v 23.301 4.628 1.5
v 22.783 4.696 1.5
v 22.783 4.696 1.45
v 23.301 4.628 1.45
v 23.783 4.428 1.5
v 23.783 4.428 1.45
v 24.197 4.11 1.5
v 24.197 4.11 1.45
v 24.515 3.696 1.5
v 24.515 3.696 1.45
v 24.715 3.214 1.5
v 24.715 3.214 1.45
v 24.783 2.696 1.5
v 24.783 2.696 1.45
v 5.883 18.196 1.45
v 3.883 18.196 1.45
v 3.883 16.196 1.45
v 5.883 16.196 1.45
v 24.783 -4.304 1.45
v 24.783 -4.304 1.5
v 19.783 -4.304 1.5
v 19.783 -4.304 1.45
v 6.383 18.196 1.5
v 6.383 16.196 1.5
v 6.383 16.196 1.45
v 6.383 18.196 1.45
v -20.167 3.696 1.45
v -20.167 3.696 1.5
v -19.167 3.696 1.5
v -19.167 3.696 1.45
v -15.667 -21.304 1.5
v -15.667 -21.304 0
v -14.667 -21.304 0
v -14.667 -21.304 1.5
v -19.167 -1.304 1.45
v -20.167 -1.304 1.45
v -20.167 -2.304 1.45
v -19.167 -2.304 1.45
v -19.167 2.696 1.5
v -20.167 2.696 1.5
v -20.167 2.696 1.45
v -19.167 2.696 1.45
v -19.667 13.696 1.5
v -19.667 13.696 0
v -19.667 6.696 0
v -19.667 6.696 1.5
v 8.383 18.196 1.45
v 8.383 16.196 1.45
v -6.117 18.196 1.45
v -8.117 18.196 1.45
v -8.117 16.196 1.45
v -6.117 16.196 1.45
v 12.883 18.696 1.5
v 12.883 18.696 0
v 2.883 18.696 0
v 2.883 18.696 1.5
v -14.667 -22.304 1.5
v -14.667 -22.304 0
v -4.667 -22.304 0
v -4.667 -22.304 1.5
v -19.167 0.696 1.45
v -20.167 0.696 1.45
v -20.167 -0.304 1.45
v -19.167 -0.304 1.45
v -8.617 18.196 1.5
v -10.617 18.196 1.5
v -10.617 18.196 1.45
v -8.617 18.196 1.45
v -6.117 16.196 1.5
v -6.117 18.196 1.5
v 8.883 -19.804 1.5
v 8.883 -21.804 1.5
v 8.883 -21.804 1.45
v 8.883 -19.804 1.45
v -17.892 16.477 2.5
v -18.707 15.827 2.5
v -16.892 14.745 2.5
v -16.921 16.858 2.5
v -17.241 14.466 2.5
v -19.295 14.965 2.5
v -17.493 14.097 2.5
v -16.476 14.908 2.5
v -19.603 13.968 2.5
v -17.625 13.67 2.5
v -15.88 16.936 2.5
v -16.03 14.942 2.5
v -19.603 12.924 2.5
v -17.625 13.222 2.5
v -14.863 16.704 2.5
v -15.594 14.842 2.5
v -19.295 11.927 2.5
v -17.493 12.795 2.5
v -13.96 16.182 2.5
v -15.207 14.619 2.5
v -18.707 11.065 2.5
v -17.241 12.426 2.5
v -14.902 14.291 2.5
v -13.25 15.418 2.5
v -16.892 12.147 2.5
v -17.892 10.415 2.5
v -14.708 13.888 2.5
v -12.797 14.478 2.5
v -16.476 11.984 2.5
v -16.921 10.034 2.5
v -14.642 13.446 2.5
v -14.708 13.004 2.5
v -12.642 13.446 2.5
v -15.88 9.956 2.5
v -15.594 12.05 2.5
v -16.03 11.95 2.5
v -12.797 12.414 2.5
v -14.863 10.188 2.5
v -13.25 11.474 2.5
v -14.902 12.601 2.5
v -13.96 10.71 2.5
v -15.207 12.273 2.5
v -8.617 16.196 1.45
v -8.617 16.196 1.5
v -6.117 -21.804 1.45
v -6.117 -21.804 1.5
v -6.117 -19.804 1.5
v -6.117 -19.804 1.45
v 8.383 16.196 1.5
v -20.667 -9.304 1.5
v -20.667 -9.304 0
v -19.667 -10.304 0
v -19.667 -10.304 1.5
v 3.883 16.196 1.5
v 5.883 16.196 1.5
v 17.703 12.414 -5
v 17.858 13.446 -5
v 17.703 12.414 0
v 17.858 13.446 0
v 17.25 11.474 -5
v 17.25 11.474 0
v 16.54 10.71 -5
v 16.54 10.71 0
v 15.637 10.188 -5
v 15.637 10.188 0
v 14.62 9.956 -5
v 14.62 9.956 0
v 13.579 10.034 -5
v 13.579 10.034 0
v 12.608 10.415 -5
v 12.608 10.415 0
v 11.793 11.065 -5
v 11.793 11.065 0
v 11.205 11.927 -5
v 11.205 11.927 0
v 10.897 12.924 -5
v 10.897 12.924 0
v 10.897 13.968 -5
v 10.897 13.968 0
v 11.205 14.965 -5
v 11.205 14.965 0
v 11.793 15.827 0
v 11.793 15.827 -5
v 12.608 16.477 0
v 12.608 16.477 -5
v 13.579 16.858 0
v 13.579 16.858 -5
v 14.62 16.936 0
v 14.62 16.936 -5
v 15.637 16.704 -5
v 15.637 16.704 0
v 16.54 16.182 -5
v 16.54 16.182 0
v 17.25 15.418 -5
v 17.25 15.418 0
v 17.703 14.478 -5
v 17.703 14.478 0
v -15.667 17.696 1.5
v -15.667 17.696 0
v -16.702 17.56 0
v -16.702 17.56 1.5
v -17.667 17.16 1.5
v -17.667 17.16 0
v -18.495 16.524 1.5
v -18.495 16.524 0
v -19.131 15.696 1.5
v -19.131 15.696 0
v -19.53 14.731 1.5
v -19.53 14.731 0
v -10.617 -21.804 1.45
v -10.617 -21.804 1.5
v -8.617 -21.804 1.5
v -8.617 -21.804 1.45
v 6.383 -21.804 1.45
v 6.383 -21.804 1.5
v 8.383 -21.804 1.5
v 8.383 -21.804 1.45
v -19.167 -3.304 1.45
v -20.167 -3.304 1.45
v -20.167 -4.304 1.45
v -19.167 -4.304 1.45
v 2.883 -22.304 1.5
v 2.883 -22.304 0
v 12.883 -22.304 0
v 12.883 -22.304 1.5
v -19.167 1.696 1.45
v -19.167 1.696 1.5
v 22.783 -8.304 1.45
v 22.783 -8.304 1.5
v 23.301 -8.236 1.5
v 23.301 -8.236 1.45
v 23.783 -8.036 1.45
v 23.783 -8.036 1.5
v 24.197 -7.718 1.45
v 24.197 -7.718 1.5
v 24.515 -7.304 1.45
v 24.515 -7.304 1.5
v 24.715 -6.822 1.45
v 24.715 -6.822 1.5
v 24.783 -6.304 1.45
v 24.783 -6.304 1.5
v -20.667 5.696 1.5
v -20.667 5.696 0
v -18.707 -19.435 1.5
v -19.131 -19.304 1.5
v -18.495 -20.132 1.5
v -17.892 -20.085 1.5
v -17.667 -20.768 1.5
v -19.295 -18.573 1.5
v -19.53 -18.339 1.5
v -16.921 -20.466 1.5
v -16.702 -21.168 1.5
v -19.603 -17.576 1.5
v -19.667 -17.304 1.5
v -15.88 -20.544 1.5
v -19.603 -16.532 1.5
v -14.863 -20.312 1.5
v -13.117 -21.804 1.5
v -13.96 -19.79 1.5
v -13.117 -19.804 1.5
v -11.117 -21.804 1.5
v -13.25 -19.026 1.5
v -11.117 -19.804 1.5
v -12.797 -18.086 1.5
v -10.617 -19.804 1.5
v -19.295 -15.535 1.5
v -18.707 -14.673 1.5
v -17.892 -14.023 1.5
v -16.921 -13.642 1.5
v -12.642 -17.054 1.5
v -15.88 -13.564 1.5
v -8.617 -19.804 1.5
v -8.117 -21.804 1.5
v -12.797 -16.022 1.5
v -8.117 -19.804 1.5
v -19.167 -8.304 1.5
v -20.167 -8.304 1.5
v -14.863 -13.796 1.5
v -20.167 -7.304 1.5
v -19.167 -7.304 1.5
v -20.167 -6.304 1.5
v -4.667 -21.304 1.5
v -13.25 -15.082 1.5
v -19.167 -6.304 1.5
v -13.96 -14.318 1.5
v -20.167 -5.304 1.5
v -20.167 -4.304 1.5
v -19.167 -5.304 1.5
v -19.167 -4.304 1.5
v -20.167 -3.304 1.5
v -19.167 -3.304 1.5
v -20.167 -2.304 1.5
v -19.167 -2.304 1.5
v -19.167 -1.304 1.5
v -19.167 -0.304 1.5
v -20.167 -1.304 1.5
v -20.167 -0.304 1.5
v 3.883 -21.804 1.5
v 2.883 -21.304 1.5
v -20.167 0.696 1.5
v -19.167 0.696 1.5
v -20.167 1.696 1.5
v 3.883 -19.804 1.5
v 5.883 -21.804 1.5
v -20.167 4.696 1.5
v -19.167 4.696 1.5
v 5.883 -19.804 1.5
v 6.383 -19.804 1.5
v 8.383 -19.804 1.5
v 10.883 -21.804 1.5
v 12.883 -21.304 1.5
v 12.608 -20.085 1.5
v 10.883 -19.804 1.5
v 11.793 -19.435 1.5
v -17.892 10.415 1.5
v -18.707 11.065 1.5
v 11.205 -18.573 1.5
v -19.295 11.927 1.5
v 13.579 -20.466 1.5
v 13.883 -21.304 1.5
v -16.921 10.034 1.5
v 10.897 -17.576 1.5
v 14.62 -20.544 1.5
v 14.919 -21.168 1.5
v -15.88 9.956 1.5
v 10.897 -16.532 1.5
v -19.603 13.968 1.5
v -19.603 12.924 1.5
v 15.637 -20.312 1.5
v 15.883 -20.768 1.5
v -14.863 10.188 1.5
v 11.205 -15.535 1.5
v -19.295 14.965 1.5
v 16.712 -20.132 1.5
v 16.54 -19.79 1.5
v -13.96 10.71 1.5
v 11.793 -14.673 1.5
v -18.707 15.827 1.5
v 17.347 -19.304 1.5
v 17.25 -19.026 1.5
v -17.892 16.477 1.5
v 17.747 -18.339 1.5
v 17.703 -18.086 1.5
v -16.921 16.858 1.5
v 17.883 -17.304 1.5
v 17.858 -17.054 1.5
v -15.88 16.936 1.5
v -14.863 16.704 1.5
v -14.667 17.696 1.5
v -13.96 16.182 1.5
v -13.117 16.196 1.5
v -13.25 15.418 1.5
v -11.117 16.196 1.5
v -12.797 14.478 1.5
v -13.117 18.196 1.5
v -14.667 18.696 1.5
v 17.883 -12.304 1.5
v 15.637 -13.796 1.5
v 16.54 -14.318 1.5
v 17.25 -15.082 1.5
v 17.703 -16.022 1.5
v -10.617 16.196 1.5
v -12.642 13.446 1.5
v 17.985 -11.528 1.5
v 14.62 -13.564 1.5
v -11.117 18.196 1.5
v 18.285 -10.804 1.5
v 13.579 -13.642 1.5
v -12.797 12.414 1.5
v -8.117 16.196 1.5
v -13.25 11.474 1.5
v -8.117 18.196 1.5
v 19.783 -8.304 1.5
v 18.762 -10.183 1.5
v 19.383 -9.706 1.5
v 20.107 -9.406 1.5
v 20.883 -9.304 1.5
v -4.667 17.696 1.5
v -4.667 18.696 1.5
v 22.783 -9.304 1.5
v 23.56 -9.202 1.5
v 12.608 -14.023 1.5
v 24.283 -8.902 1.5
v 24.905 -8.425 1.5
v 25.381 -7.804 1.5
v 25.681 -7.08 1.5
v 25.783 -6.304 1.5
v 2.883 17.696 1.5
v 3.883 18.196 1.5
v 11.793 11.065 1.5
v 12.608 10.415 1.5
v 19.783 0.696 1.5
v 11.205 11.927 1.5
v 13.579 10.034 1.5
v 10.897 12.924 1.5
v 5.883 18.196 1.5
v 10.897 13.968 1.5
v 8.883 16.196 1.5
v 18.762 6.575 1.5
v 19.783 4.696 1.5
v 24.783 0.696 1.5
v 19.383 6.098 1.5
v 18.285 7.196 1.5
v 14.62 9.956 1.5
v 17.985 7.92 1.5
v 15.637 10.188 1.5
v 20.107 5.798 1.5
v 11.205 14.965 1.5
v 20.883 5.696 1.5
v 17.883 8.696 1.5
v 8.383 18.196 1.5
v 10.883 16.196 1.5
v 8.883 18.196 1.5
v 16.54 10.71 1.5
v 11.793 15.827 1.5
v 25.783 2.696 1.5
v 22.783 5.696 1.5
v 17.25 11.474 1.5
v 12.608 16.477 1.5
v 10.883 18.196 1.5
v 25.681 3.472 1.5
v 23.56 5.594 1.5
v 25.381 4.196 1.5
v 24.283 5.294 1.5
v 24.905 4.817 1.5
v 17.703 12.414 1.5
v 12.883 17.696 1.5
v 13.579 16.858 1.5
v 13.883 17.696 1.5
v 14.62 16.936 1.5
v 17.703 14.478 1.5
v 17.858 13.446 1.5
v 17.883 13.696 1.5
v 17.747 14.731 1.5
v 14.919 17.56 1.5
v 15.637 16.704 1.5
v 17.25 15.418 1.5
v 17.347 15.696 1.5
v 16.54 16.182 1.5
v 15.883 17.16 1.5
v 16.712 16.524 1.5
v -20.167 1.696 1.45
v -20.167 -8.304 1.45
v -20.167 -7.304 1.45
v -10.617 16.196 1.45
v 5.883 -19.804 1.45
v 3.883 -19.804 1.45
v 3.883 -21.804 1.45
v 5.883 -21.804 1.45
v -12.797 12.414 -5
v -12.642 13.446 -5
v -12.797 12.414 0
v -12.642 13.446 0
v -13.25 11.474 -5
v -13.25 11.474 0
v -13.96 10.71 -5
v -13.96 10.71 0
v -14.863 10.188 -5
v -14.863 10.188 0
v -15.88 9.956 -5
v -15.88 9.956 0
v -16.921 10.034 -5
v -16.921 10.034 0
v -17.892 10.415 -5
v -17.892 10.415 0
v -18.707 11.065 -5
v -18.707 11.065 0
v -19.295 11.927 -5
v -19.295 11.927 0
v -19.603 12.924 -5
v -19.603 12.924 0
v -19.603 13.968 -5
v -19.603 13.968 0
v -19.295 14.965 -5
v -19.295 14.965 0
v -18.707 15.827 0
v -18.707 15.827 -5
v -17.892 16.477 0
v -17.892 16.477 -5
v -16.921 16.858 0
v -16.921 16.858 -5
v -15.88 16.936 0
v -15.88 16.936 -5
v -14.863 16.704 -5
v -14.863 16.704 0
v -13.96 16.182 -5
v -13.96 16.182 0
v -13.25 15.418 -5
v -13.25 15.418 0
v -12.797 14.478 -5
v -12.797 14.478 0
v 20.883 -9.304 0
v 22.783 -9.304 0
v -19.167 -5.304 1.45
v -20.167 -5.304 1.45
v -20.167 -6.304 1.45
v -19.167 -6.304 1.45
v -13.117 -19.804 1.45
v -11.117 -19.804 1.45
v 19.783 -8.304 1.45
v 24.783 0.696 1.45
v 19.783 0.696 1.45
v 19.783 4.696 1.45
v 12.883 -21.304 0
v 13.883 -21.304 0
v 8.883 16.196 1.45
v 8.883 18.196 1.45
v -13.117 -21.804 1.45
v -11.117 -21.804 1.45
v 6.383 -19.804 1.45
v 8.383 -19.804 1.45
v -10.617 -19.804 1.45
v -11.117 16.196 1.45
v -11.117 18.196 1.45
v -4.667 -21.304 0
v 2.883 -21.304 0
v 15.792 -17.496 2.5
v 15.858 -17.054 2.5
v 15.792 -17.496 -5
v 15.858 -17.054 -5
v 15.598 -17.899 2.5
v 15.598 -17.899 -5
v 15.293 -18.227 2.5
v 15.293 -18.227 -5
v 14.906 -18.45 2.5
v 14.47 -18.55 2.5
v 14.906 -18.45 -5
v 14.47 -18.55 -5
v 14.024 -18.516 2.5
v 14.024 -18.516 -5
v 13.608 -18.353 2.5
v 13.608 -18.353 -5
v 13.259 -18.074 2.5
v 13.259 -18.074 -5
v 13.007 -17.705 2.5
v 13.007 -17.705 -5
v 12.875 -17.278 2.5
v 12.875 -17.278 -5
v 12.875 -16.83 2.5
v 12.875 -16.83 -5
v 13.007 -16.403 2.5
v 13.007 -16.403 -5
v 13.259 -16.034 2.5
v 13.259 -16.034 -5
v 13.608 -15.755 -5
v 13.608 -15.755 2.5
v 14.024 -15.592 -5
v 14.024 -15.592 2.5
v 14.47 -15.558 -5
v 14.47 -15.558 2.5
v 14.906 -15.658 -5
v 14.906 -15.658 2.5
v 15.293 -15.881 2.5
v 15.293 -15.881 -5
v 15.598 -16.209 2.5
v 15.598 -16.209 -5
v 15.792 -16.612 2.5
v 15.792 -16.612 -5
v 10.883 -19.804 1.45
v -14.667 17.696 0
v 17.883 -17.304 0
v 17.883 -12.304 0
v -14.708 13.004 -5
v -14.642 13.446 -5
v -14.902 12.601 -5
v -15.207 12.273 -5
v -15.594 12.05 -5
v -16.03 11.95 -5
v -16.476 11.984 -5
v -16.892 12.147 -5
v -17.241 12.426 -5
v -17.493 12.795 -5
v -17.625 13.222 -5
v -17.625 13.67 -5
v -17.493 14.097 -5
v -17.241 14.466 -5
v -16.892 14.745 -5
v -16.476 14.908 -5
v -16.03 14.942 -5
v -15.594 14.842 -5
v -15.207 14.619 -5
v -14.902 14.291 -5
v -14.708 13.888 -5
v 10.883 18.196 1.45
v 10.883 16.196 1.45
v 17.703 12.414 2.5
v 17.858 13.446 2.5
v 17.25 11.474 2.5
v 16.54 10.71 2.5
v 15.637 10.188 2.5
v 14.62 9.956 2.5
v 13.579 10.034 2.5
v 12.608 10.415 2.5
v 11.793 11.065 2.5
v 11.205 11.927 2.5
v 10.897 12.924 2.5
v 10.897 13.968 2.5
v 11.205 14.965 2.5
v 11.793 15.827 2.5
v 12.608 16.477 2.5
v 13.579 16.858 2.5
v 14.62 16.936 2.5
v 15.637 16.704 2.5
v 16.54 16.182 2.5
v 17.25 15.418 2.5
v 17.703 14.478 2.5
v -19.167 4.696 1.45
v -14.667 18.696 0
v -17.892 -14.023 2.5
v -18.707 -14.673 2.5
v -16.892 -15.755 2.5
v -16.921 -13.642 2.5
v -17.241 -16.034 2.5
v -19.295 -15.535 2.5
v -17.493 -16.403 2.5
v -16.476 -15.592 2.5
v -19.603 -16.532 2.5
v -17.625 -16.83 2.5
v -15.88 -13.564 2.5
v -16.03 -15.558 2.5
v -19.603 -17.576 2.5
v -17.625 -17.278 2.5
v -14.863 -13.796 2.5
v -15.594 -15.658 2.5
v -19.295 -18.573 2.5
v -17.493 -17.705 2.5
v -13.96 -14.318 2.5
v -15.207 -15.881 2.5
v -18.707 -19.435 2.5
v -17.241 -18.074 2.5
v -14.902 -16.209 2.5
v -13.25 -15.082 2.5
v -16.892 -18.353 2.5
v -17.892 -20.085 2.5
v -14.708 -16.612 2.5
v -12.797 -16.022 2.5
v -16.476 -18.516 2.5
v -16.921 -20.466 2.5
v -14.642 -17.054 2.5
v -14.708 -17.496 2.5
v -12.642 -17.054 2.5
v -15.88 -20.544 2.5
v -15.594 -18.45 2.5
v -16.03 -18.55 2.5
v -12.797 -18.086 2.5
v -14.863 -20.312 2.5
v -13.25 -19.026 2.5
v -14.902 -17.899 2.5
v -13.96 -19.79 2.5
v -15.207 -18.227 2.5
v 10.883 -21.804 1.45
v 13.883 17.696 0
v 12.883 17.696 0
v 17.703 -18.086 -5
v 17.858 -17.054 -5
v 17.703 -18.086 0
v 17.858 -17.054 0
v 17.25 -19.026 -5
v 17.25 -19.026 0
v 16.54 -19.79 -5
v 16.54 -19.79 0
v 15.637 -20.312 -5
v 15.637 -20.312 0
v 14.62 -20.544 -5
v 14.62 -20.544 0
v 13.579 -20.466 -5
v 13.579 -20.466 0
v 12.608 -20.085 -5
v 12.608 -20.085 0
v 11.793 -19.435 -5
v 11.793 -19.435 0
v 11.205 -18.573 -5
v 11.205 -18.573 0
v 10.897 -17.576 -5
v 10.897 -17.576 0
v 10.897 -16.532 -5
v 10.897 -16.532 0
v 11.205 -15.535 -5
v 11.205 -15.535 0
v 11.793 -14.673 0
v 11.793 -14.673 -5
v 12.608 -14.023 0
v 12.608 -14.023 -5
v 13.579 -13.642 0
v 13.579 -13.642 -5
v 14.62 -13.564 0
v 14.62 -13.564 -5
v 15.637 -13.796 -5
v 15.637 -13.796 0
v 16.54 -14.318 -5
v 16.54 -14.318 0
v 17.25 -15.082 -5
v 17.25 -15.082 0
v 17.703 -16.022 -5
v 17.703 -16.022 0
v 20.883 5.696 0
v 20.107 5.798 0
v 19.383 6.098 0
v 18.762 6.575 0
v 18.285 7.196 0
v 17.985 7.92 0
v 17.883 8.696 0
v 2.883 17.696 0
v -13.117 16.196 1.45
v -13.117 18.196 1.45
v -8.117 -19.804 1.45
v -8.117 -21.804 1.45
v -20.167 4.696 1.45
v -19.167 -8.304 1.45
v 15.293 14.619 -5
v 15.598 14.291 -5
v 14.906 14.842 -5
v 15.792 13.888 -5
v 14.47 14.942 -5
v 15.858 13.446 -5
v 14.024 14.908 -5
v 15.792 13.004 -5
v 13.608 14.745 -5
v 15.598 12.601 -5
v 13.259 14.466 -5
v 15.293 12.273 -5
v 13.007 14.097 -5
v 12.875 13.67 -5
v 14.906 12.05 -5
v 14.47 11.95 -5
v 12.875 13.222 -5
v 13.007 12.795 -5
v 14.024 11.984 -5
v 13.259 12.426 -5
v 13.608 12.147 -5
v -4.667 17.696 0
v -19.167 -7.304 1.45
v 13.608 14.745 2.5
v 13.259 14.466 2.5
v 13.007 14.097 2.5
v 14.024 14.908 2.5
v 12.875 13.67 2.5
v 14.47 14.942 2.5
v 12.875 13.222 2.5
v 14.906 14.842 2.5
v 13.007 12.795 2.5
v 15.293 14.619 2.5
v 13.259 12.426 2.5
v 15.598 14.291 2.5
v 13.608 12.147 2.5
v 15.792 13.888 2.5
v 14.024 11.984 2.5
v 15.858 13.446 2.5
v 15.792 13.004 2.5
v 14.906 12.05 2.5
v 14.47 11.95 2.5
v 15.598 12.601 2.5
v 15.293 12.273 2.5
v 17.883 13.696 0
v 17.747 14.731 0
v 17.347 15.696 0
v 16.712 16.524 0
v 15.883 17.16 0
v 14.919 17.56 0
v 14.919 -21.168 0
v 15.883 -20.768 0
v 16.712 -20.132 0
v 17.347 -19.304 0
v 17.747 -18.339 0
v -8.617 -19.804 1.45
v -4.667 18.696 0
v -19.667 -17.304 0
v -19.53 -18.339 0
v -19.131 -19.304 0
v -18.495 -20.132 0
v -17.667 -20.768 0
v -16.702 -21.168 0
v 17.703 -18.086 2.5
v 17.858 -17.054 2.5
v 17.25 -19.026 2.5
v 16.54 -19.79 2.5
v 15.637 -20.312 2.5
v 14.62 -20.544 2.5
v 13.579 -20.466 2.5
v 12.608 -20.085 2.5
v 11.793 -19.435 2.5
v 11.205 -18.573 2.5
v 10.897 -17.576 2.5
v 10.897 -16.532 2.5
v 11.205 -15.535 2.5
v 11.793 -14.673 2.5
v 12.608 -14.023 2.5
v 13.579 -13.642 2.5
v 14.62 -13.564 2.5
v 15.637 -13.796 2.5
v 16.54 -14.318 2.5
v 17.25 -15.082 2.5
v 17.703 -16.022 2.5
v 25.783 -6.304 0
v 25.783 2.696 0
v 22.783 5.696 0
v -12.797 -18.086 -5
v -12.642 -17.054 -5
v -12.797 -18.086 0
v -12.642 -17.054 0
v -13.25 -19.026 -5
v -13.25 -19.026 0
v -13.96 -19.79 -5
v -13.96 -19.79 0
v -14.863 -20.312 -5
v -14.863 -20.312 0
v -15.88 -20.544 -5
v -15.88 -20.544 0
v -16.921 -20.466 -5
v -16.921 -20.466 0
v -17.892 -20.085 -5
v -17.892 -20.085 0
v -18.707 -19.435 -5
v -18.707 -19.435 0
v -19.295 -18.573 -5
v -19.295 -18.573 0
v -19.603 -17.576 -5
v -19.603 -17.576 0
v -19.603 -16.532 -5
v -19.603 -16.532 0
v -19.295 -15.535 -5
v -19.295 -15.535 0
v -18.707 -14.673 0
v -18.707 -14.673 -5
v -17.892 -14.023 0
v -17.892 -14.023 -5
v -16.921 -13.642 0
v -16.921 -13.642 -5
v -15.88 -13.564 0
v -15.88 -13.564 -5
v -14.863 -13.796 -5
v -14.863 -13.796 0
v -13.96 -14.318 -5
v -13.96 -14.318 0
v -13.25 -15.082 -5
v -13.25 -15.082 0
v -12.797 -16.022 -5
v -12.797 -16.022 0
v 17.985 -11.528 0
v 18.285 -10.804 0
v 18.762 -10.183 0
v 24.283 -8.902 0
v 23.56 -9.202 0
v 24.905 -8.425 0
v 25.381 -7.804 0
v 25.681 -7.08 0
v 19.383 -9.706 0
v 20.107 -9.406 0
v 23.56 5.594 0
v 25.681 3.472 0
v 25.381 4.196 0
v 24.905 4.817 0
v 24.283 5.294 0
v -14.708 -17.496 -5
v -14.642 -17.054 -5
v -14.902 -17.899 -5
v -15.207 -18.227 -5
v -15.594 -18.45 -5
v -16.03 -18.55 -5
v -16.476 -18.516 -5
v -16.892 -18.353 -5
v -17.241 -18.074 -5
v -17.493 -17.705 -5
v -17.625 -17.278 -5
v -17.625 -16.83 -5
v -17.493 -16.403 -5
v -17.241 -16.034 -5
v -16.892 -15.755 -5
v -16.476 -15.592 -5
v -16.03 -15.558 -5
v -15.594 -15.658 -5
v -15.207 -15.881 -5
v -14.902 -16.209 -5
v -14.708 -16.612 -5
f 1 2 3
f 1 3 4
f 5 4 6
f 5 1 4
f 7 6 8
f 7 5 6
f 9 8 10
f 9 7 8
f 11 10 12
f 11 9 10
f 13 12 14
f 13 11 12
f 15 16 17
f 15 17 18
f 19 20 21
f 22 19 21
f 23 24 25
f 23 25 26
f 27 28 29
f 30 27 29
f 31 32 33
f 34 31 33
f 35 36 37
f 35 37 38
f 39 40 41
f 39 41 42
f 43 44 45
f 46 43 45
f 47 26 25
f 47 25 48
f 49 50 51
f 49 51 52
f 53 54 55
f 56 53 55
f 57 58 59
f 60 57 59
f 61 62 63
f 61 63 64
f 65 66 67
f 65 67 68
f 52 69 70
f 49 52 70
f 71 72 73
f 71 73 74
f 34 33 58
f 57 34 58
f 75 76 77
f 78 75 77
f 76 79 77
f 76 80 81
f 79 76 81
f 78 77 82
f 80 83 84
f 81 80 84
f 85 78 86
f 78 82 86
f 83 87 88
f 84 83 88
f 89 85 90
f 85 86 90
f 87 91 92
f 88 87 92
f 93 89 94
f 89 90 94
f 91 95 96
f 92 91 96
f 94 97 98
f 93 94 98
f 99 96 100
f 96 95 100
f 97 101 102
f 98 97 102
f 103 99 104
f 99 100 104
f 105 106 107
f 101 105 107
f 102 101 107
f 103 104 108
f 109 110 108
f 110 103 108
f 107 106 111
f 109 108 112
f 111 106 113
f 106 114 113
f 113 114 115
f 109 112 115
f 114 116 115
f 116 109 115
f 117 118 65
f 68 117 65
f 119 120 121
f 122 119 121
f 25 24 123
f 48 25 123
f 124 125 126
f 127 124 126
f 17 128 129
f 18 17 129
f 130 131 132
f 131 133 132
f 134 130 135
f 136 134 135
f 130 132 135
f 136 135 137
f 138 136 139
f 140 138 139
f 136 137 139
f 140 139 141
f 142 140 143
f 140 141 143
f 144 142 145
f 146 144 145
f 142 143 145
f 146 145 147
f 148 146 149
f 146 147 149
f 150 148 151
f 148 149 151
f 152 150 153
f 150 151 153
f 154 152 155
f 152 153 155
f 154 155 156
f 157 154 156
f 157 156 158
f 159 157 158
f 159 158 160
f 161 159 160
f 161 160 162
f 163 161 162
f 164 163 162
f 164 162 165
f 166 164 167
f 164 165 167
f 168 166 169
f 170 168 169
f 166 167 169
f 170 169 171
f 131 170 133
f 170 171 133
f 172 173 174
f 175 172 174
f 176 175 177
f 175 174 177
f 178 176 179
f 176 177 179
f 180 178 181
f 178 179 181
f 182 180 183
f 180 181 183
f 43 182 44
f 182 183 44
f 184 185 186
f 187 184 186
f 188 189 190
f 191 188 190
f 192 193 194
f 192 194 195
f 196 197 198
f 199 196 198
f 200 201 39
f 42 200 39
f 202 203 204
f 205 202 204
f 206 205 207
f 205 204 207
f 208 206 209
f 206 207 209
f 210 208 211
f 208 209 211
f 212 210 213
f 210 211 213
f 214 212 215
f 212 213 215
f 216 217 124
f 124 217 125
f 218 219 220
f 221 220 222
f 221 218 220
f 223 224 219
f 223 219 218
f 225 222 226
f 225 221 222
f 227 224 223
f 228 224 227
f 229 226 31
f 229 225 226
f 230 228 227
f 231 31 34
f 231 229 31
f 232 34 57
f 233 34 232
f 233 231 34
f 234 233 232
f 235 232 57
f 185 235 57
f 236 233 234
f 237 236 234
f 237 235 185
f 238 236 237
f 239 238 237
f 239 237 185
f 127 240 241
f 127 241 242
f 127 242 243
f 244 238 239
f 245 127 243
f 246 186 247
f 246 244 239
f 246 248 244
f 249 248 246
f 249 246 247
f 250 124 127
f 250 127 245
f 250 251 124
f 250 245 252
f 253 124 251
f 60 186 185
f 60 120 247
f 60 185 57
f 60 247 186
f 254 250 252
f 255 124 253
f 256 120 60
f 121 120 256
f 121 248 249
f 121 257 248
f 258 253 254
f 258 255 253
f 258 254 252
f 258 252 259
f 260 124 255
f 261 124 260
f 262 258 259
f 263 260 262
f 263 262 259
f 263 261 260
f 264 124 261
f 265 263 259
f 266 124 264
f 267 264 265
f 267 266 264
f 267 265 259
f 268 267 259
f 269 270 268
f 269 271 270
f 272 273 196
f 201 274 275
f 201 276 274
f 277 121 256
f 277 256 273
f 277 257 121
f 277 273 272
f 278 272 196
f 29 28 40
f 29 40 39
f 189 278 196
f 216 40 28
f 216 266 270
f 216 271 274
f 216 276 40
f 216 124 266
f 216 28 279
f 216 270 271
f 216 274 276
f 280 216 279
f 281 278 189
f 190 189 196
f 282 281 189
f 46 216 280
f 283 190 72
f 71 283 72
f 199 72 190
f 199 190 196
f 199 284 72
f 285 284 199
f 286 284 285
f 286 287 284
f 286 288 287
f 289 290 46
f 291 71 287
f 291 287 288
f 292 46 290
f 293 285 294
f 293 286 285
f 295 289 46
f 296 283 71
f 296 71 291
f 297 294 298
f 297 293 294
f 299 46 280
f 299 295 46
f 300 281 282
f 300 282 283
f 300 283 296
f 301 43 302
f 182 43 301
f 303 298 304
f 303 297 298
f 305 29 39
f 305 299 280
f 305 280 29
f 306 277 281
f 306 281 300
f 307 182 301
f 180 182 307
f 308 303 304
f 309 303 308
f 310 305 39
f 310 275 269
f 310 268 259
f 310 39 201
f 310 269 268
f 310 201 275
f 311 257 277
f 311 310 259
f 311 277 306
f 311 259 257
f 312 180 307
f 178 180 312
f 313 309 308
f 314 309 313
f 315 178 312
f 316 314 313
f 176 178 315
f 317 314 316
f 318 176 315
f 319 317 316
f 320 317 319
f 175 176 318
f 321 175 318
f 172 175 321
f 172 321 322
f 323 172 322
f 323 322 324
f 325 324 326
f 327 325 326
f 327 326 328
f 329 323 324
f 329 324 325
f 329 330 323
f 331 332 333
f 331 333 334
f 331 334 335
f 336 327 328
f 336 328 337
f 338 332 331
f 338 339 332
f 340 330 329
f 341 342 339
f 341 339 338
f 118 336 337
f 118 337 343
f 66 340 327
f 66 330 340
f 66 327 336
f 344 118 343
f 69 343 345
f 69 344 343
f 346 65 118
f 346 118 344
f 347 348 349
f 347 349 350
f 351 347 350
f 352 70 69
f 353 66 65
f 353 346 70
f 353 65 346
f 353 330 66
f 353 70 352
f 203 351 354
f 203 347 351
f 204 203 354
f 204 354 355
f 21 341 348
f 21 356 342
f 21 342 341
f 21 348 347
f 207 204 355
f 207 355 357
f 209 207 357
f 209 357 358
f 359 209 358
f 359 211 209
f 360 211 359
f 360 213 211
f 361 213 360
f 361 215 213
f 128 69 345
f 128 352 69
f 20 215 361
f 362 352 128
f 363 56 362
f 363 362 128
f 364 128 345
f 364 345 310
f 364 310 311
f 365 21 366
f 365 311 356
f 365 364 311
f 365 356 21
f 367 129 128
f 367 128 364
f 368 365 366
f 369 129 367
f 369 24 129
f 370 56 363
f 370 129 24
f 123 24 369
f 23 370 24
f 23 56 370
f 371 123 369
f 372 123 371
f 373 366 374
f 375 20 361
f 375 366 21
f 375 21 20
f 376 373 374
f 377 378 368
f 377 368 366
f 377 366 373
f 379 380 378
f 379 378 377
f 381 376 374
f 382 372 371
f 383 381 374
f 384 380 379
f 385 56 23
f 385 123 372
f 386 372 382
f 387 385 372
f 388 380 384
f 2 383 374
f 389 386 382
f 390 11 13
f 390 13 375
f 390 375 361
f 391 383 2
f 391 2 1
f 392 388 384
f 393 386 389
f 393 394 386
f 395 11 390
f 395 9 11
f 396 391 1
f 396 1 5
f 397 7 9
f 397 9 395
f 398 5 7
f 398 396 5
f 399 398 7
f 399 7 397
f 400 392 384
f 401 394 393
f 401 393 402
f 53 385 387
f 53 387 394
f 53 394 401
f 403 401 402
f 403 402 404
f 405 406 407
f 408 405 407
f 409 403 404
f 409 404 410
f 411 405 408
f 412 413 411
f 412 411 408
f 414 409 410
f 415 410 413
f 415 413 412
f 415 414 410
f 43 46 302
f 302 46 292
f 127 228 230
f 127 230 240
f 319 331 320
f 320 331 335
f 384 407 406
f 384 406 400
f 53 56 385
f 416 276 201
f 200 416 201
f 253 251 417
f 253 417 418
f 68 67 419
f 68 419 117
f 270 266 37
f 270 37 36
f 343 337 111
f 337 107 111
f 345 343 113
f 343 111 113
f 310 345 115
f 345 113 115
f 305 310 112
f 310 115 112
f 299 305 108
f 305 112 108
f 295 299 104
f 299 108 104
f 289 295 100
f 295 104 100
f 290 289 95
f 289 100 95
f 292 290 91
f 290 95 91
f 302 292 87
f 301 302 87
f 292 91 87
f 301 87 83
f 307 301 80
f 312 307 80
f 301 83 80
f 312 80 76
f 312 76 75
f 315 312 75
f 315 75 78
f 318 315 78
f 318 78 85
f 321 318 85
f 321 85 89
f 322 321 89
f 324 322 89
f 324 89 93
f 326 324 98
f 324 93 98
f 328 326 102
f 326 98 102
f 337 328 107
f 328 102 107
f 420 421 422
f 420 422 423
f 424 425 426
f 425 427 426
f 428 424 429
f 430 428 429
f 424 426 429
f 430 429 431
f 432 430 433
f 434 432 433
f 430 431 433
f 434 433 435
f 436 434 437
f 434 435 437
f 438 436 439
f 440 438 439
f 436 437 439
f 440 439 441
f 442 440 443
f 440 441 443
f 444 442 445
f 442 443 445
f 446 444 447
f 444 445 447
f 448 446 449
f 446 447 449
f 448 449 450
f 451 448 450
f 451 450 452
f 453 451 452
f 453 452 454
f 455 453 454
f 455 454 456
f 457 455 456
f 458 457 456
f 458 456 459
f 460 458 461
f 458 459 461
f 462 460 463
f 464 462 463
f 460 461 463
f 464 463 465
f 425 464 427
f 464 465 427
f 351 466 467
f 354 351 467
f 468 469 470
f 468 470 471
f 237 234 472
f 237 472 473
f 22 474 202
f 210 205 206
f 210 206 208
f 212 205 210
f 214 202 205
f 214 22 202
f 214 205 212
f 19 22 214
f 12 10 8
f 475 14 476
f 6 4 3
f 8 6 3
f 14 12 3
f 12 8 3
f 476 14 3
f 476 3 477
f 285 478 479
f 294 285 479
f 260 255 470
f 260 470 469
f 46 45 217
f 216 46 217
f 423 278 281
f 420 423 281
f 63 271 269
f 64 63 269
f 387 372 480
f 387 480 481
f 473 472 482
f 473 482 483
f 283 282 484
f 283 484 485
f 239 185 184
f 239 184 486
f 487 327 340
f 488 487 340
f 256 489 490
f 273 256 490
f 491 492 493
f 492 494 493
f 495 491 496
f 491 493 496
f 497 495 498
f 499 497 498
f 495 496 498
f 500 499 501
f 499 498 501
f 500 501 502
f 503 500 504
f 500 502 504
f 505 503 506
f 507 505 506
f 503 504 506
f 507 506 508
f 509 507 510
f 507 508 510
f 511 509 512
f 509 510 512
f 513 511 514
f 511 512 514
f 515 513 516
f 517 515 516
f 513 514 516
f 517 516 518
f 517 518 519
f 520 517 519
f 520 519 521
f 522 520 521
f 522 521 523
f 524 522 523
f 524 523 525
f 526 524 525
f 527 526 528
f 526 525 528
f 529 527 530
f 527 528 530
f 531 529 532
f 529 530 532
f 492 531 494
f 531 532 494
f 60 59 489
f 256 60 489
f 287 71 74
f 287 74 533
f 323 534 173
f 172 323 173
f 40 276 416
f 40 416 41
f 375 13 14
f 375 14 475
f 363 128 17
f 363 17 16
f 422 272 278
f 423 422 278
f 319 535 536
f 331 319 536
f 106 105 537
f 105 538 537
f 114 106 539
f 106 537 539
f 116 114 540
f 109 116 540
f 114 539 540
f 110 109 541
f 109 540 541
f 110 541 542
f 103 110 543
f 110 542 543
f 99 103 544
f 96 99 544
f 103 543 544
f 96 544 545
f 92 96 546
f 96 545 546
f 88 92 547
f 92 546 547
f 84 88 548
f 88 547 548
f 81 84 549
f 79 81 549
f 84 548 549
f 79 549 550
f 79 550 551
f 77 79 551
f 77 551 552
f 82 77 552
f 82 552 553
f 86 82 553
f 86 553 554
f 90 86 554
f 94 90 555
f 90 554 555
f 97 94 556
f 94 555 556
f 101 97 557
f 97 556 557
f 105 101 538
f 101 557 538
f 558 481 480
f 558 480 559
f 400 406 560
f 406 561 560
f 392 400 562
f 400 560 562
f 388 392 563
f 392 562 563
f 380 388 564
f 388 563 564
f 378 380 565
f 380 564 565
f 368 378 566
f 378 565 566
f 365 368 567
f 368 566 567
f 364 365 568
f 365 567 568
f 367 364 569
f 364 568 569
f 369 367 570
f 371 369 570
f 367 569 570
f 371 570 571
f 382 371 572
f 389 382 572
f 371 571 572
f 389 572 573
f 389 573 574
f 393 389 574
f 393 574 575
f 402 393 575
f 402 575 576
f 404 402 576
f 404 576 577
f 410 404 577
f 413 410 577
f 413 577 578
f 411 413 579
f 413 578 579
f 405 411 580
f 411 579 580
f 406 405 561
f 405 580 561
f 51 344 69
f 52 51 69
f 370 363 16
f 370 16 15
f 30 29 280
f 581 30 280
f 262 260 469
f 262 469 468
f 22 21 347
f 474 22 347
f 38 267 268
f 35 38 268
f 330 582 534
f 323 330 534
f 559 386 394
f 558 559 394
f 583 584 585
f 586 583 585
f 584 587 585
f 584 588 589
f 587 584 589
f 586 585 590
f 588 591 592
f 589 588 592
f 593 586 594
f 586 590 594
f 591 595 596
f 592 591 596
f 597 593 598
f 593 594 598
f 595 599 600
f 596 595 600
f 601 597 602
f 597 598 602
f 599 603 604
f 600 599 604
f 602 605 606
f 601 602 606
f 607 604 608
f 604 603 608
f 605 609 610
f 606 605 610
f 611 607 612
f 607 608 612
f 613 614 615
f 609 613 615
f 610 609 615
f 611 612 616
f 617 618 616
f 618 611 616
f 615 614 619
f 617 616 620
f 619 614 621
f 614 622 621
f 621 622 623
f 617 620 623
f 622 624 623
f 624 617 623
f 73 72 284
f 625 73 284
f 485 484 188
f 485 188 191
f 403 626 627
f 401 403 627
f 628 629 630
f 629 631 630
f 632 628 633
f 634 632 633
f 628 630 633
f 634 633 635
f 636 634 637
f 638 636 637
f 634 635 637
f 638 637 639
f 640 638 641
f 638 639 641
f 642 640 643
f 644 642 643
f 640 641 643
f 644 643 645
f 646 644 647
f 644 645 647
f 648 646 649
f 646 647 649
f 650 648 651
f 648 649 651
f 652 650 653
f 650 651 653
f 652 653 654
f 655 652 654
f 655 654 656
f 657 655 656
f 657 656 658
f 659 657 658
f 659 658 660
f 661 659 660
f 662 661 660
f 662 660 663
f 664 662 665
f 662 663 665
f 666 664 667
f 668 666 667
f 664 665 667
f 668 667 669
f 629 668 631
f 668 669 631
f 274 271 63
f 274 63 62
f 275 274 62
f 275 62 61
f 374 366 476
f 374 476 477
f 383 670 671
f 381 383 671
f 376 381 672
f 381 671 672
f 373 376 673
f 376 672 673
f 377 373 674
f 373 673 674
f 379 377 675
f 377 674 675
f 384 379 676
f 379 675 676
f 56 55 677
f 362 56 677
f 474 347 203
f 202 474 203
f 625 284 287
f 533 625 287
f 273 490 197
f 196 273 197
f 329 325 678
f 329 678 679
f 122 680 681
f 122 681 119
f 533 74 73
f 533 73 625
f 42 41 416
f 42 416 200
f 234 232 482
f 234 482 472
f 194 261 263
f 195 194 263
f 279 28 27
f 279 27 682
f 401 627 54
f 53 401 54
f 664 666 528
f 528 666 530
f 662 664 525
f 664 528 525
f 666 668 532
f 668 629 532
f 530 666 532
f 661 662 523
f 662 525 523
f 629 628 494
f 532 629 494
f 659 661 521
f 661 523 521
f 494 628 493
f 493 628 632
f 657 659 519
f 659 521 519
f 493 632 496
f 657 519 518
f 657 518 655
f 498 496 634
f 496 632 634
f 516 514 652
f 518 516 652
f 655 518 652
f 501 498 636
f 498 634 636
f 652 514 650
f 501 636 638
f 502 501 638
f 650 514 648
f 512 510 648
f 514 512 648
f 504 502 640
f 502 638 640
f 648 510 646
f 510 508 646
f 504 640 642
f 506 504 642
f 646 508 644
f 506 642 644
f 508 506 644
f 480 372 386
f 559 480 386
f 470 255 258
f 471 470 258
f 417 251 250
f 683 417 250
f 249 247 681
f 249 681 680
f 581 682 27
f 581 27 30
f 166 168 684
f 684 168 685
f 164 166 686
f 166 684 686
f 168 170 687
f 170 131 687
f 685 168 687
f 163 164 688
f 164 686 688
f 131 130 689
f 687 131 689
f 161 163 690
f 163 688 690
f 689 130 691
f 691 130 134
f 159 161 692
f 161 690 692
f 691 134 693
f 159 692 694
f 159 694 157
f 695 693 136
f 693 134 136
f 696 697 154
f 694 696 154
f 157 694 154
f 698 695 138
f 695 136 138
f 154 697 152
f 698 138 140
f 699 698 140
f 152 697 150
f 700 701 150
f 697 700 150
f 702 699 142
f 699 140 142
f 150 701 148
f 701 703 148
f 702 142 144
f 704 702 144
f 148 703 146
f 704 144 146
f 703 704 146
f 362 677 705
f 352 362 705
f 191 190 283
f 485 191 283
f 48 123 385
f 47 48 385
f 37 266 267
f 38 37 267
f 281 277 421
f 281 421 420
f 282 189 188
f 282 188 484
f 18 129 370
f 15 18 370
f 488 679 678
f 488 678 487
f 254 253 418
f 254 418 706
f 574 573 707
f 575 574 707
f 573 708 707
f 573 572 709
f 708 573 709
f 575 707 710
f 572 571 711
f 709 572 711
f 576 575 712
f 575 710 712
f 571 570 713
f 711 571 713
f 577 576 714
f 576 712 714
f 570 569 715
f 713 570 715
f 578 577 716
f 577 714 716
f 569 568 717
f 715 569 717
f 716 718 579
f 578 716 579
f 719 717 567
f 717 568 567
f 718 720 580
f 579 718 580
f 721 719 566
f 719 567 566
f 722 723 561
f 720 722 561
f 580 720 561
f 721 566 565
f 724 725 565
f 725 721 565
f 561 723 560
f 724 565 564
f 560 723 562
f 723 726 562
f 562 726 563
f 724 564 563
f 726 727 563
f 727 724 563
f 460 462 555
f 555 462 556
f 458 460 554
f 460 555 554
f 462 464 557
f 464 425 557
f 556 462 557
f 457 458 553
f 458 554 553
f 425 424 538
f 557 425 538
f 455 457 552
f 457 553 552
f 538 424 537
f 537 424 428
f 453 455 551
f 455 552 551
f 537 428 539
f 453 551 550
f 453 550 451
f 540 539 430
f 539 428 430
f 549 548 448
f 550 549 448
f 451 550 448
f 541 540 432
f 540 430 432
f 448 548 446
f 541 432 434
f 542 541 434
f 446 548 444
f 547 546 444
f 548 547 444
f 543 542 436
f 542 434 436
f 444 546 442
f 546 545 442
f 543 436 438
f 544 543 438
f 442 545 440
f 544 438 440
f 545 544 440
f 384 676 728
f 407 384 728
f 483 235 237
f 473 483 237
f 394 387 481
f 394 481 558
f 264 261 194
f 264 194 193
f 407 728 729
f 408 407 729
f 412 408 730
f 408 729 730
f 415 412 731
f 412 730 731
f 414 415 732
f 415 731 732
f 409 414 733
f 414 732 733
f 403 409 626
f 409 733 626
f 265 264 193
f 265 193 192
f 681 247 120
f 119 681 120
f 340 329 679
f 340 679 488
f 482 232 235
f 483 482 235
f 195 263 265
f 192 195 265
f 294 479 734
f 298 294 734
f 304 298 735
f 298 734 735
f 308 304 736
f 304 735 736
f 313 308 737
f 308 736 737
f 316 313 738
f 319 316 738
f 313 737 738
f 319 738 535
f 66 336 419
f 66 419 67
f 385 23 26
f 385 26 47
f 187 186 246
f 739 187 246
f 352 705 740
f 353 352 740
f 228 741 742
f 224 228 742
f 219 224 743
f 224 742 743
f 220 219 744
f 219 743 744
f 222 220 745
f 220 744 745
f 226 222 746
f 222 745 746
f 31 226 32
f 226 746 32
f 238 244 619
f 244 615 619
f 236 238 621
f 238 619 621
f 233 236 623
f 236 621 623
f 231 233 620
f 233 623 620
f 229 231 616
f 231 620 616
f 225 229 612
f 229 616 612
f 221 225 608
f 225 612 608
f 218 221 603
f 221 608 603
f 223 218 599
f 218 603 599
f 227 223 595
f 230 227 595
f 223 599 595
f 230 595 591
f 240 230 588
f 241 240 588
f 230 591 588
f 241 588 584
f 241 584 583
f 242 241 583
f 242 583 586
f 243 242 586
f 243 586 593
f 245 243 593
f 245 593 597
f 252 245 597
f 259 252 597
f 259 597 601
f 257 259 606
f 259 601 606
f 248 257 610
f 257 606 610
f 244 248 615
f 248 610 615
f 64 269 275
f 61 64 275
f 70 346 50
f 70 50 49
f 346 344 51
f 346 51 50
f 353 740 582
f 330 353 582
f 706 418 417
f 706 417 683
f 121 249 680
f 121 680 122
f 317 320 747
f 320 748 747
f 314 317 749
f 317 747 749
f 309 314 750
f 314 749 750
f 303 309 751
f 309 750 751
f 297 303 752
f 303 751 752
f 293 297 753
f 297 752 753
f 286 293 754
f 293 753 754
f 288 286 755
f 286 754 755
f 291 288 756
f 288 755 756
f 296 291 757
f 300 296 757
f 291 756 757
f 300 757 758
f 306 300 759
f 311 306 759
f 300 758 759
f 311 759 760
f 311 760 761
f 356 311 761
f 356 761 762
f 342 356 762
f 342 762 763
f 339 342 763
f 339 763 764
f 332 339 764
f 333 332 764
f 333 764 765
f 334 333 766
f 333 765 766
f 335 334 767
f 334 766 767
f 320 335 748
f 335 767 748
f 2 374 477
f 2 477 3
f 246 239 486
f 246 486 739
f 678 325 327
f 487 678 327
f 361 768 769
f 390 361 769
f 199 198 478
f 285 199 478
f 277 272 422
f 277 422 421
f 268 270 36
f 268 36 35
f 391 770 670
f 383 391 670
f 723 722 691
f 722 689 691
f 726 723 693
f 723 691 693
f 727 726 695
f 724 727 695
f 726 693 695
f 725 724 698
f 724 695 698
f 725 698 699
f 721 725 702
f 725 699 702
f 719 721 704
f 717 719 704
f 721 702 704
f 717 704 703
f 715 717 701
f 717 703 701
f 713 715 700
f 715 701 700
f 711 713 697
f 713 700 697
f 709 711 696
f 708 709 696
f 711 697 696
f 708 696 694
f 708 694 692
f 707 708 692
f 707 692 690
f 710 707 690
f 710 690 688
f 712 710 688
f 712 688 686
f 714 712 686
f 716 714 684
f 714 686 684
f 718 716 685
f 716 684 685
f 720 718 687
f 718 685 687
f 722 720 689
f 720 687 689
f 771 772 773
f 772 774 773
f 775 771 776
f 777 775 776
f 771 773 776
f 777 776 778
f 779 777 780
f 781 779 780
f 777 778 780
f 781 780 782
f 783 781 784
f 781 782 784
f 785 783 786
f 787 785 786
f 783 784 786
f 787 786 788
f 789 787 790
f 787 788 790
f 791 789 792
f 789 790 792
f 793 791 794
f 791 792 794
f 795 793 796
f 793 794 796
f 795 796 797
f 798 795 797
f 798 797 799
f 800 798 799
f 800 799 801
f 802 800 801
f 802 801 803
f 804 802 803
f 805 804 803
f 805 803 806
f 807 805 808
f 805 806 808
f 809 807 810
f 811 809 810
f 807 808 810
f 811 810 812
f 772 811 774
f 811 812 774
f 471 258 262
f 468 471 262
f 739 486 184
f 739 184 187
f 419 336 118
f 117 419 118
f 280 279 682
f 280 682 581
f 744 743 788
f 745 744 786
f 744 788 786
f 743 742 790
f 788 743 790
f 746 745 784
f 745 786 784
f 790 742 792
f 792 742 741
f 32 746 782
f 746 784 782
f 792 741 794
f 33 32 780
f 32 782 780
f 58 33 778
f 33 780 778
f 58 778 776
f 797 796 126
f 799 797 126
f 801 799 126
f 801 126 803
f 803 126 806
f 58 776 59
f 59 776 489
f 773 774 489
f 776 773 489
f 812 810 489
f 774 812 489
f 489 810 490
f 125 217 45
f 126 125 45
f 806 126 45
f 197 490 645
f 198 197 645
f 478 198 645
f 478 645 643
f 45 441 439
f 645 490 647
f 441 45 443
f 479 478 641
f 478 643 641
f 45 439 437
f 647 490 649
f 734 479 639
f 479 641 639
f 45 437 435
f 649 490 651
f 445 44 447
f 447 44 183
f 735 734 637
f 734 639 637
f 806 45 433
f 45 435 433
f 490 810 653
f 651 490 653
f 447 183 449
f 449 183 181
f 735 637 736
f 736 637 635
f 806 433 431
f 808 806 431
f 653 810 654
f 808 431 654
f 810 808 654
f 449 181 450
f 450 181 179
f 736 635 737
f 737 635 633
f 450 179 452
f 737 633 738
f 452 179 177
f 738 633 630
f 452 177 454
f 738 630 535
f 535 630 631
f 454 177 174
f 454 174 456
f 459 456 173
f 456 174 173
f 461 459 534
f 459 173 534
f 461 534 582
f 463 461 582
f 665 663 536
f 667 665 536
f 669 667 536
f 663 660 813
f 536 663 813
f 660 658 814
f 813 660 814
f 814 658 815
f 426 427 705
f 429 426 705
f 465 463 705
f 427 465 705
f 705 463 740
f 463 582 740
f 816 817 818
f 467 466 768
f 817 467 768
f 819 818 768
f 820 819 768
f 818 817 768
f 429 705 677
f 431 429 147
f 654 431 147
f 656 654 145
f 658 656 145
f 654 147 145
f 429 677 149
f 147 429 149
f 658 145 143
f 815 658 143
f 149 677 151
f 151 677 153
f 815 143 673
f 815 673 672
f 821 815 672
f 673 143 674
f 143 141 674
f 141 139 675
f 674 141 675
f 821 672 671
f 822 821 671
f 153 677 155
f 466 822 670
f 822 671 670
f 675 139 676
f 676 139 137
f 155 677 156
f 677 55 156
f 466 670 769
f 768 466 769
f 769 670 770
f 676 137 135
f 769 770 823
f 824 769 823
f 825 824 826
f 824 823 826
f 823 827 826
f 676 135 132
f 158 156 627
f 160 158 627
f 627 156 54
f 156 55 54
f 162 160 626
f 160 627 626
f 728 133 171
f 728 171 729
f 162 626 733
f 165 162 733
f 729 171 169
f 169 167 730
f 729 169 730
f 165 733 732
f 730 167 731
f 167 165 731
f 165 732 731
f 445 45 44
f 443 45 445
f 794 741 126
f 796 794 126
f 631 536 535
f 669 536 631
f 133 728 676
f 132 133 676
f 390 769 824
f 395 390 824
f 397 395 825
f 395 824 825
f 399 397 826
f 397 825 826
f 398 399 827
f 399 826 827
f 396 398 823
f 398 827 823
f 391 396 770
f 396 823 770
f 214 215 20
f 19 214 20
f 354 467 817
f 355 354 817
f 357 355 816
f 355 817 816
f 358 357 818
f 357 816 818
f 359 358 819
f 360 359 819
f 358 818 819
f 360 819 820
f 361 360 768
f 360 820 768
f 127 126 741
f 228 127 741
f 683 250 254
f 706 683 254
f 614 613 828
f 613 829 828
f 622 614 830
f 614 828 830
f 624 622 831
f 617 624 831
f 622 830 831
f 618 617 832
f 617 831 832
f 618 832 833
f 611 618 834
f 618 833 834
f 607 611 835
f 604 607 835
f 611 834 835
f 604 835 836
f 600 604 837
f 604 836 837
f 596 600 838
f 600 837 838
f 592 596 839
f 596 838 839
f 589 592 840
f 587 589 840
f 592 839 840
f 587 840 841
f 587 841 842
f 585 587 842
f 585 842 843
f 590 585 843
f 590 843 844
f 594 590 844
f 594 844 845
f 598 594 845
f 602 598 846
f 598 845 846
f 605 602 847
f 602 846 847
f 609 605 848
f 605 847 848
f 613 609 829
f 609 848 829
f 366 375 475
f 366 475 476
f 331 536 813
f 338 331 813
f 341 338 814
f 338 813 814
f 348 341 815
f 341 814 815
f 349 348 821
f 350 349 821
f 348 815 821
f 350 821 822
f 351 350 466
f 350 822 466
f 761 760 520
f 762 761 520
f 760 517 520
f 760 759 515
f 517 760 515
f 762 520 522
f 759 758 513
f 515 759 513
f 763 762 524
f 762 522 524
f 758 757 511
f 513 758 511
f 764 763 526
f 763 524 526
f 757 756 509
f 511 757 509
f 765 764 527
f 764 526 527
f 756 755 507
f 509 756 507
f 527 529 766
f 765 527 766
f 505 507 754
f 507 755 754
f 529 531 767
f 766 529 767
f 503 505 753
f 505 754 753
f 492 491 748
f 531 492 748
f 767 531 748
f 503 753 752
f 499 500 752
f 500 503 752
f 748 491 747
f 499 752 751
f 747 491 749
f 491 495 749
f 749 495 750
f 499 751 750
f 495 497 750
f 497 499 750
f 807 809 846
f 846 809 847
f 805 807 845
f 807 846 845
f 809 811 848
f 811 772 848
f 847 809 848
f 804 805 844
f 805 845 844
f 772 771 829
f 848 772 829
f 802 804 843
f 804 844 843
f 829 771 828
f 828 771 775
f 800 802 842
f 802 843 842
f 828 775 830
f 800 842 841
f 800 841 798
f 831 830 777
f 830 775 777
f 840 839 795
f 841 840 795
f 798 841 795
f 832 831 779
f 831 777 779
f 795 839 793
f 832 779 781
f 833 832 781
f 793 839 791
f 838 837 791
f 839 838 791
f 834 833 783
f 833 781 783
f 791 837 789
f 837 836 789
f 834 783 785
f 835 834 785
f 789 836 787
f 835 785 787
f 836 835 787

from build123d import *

# Parameters (mm, degrees)
CROQUIS1_R              = 2.5
SALIENTE_EXTRUIR1_DEPTH = 1.5
MATRIZL1_COUNT          = 2
MATRIZL1_PITCH          = 30.5
MATRIZL1_COUNT_DIR2     = 2
MATRIZL1_PITCH_DIR2     = 30.5
CROQUIS4_W              = 2
CROQUIS4_H              = 2
CROQUIS4_W_2            = 1
CROQUIS4_H_2            = 1
CORTAR_EXTRUIR1_DEPTH   = 0.05


with BuildPart() as part:
    # Croquis1 → Saliente-Extruir1 (new body)
    with BuildSketch(Plane.XY):
        with BuildLine():
            Line((-19.66677388, 13.695977011), (-19.66677388, 6.695977011))
            Line((-19.66677388, 6.695977011), (-20.66677388, 5.695977011))
            Line((-20.66677388, 5.695977011), (-20.66677388, -9.304022989))
            Line((-20.66677388, -9.304022989), (-19.66677388, -10.304022989))
            Line((-19.66677388, -10.304022989), (-19.66677388, -17.304022989))
            ThreePointArc((-19.66677388, -17.304022989), (-18.495201005, -20.132450113), (-15.66677388, -21.304022989))
            Line((-15.66677388, -21.304022989), (-14.66677388, -21.304022989))
            Line((-14.66677388, -21.304022989), (-14.66677388, -22.304022989))
            Line((-14.66677388, -22.304022989), (-4.66677388, -22.304022989))
            Line((-4.66677388, -22.304022989), (-4.66677388, -21.304022989))
            Line((-4.66677388, -21.304022989), (2.88322612, -21.304022989))
            Line((2.88322612, -21.304022989), (2.88322612, -22.304022989))
            Line((2.88322612, -22.304022989), (12.88322612, -22.304022989))
            Line((12.88322612, -22.304022989), (12.88322612, -21.304022989))
            Line((12.88322612, -21.304022989), (13.88322612, -21.304022989))
            ThreePointArc((13.88322612, -21.304022989), (16.711653245, -20.132450113), (17.88322612, -17.304022989))
            Line((17.88322612, -17.304022989), (17.88322612, -12.304022989))
            ThreePointArc((17.88322612, -12.304022989), (18.761905777, -10.182702645), (20.88322612, -9.304022989))
            Line((20.88322612, -9.304022989), (22.78322612, -9.304022989))
            ThreePointArc((22.78322612, -9.304022989), (24.904546464, -8.425343332), (25.78322612, -6.304022989))
            Line((25.78322612, -6.304022989), (25.78322612, 2.695977011))
            ThreePointArc((25.78322612, 2.695977011), (24.904546464, 4.817297355), (22.78322612, 5.695977011))
            Line((22.78322612, 5.695977011), (20.88322612, 5.695977011))
            ThreePointArc((20.88322612, 5.695977011), (18.761905777, 6.574656668), (17.88322612, 8.695977011))
            Line((17.88322612, 8.695977011), (17.88322612, 13.695977011))
            ThreePointArc((17.88322612, 13.695977011), (16.711653245, 16.524404136), (13.88322612, 17.695977011))
            Line((13.88322612, 17.695977011), (12.88322612, 17.695977011))
            Line((12.88322612, 17.695977011), (12.88322612, 18.695977011))
            Line((12.88322612, 18.695977011), (2.88322612, 18.695977011))
            Line((2.88322612, 18.695977011), (2.88322612, 17.695977011))
            Line((2.88322612, 17.695977011), (-4.66677388, 17.695977011))
            Line((-4.66677388, 17.695977011), (-4.66677388, 18.695977011))
            Line((-4.66677388, 18.695977011), (-14.66677388, 18.695977011))
            Line((-14.66677388, 18.695977011), (-14.66677388, 17.695977011))
            Line((-14.66677388, 17.695977011), (-15.66677388, 17.695977011))
            ThreePointArc((-15.66677388, 17.695977011), (-18.495201005, 16.524404136), (-19.66677388, 13.695977011))
        make_face()
        with Locations((-16.14177388, 13.445977011)):
            Circle(CROQUIS1_R, mode=Mode.SUBTRACT)
        with Locations((14.35822612, 13.445977011)):
            Circle(CROQUIS1_R, mode=Mode.SUBTRACT)
        with Locations((14.35822612, -17.054022989)):
            Circle(CROQUIS1_R, mode=Mode.SUBTRACT)
        with Locations((-16.14177388, -17.054022989)):
            Circle(CROQUIS1_R, mode=Mode.SUBTRACT)
    extrude(amount=SALIENTE_EXTRUIR1_DEPTH)

    # Croquis3 → Revolución1 (revolve)
    with BuildSketch(Plane(origin=(0, -17.054022989, 0), x_dir=(-1, 0, 0), z_dir=(0, -1, 0)), mode=Mode.PRIVATE) as revoluci_n1_sk:
        Polygon((18.64177388, -1.5), (19.64177388, -1.5), (19.64177388, -2.5), (17.64177388, -2.5), (17.64177388, 5), (19.64177388, 5), (19.64177388, 0), (18.64177388, 0), align=None)
    revoluci_n1 = revolve(revoluci_n1_sk.sketch.rotate(Axis((-16.14177388, -17.054022989, 2.5), (0, 0, -1)), 180), axis=Axis((-16.14177388, -17.054022989, 2.5), (0, 0, -1)))

    # MatrizL1: Revoluci_n1 2 × 2
    with Locations(*[(i * MATRIZL1_PITCH, j * MATRIZL1_PITCH_DIR2, 0) for i in range(MATRIZL1_COUNT) for j in range(MATRIZL1_COUNT_DIR2) if (i, j) != (0, 0)]):
        add(revoluci_n1)

    # Croquis4 → Cortar-Extruir1 (cut)
    with BuildSketch(Plane.XY.offset(1.5)):
        with BuildLine():
            Line((19.78322612, -8.304022989), (22.78322612, -8.304022989))
            ThreePointArc((22.78322612, -8.304022989), (24.197439683, -7.718236551), (24.78322612, -6.304022989))
            Line((24.78322612, -6.304022989), (24.78322612, -4.304022989))
            Line((24.78322612, -4.304022989), (19.78322612, -4.304022989))
            Line((19.78322612, -4.304022989), (19.78322612, -8.304022989))
        make_face()
        with Locations((9.88322612, -20.804022989)):
            Rectangle(CROQUIS4_W, CROQUIS4_H)
        with Locations((-19.66677388, -7.804022989)):
            Rectangle(CROQUIS4_W_2, CROQUIS4_H_2)
        with Locations((7.38322612, -20.804022989)):
            Rectangle(CROQUIS4_W, CROQUIS4_H)
        with Locations((4.88322612, -20.804022989)):
            Rectangle(CROQUIS4_W, CROQUIS4_H)
        with Locations((-7.11677388, -20.804022989)):
            Rectangle(CROQUIS4_W, CROQUIS4_H)
        with Locations((-9.61677388, -20.804022989)):
            Rectangle(CROQUIS4_W, CROQUIS4_H)
        with Locations((-12.11677388, -20.804022989)):
            Rectangle(CROQUIS4_W, CROQUIS4_H)
        with Locations((-19.66677388, -5.804022989)):
            Rectangle(CROQUIS4_W_2, CROQUIS4_H_2)
        with Locations((-19.66677388, -3.804022989)):
            Rectangle(CROQUIS4_W_2, CROQUIS4_H_2)
        with Locations((-19.66677388, -1.804022989)):
            Rectangle(CROQUIS4_W_2, CROQUIS4_H_2)
        with Locations((-19.66677388, 0.195977011)):
            Rectangle(CROQUIS4_W_2, CROQUIS4_H_2)
        with Locations((-19.66677388, 2.195977011)):
            Rectangle(CROQUIS4_W_2, CROQUIS4_H_2)
        with Locations((-19.66677388, 4.195977011)):
            Rectangle(CROQUIS4_W_2, CROQUIS4_H_2)
        with Locations((-12.11677388, 17.195977011)):
            Rectangle(CROQUIS4_W, CROQUIS4_H)
        with Locations((-9.61677388, 17.195977011)):
            Rectangle(CROQUIS4_W, CROQUIS4_H)
        with Locations((-7.11677388, 17.195977011)):
            Rectangle(CROQUIS4_W, CROQUIS4_H)
        with Locations((4.88322612, 17.195977011)):
            Rectangle(CROQUIS4_W, CROQUIS4_H)
        with Locations((7.38322612, 17.195977011)):
            Rectangle(CROQUIS4_W, CROQUIS4_H)
        with Locations((9.88322612, 17.195977011)):
            Rectangle(CROQUIS4_W, CROQUIS4_H)
        with BuildLine():
            Line((24.78322612, 2.695977011), (24.78322612, 0.695977011))
            Line((24.78322612, 0.695977011), (19.78322612, 0.695977011))
            Line((19.78322612, 0.695977011), (19.78322612, 4.695977011))
            Line((19.78322612, 4.695977011), (22.78322612, 4.695977011))
            ThreePointArc((22.78322612, 4.695977011), (24.197439683, 4.110190574), (24.78322612, 2.695977011))
        make_face()
    extrude(amount=-CORTAR_EXTRUIR1_DEPTH, mode=Mode.SUBTRACT)


solid = part.part
